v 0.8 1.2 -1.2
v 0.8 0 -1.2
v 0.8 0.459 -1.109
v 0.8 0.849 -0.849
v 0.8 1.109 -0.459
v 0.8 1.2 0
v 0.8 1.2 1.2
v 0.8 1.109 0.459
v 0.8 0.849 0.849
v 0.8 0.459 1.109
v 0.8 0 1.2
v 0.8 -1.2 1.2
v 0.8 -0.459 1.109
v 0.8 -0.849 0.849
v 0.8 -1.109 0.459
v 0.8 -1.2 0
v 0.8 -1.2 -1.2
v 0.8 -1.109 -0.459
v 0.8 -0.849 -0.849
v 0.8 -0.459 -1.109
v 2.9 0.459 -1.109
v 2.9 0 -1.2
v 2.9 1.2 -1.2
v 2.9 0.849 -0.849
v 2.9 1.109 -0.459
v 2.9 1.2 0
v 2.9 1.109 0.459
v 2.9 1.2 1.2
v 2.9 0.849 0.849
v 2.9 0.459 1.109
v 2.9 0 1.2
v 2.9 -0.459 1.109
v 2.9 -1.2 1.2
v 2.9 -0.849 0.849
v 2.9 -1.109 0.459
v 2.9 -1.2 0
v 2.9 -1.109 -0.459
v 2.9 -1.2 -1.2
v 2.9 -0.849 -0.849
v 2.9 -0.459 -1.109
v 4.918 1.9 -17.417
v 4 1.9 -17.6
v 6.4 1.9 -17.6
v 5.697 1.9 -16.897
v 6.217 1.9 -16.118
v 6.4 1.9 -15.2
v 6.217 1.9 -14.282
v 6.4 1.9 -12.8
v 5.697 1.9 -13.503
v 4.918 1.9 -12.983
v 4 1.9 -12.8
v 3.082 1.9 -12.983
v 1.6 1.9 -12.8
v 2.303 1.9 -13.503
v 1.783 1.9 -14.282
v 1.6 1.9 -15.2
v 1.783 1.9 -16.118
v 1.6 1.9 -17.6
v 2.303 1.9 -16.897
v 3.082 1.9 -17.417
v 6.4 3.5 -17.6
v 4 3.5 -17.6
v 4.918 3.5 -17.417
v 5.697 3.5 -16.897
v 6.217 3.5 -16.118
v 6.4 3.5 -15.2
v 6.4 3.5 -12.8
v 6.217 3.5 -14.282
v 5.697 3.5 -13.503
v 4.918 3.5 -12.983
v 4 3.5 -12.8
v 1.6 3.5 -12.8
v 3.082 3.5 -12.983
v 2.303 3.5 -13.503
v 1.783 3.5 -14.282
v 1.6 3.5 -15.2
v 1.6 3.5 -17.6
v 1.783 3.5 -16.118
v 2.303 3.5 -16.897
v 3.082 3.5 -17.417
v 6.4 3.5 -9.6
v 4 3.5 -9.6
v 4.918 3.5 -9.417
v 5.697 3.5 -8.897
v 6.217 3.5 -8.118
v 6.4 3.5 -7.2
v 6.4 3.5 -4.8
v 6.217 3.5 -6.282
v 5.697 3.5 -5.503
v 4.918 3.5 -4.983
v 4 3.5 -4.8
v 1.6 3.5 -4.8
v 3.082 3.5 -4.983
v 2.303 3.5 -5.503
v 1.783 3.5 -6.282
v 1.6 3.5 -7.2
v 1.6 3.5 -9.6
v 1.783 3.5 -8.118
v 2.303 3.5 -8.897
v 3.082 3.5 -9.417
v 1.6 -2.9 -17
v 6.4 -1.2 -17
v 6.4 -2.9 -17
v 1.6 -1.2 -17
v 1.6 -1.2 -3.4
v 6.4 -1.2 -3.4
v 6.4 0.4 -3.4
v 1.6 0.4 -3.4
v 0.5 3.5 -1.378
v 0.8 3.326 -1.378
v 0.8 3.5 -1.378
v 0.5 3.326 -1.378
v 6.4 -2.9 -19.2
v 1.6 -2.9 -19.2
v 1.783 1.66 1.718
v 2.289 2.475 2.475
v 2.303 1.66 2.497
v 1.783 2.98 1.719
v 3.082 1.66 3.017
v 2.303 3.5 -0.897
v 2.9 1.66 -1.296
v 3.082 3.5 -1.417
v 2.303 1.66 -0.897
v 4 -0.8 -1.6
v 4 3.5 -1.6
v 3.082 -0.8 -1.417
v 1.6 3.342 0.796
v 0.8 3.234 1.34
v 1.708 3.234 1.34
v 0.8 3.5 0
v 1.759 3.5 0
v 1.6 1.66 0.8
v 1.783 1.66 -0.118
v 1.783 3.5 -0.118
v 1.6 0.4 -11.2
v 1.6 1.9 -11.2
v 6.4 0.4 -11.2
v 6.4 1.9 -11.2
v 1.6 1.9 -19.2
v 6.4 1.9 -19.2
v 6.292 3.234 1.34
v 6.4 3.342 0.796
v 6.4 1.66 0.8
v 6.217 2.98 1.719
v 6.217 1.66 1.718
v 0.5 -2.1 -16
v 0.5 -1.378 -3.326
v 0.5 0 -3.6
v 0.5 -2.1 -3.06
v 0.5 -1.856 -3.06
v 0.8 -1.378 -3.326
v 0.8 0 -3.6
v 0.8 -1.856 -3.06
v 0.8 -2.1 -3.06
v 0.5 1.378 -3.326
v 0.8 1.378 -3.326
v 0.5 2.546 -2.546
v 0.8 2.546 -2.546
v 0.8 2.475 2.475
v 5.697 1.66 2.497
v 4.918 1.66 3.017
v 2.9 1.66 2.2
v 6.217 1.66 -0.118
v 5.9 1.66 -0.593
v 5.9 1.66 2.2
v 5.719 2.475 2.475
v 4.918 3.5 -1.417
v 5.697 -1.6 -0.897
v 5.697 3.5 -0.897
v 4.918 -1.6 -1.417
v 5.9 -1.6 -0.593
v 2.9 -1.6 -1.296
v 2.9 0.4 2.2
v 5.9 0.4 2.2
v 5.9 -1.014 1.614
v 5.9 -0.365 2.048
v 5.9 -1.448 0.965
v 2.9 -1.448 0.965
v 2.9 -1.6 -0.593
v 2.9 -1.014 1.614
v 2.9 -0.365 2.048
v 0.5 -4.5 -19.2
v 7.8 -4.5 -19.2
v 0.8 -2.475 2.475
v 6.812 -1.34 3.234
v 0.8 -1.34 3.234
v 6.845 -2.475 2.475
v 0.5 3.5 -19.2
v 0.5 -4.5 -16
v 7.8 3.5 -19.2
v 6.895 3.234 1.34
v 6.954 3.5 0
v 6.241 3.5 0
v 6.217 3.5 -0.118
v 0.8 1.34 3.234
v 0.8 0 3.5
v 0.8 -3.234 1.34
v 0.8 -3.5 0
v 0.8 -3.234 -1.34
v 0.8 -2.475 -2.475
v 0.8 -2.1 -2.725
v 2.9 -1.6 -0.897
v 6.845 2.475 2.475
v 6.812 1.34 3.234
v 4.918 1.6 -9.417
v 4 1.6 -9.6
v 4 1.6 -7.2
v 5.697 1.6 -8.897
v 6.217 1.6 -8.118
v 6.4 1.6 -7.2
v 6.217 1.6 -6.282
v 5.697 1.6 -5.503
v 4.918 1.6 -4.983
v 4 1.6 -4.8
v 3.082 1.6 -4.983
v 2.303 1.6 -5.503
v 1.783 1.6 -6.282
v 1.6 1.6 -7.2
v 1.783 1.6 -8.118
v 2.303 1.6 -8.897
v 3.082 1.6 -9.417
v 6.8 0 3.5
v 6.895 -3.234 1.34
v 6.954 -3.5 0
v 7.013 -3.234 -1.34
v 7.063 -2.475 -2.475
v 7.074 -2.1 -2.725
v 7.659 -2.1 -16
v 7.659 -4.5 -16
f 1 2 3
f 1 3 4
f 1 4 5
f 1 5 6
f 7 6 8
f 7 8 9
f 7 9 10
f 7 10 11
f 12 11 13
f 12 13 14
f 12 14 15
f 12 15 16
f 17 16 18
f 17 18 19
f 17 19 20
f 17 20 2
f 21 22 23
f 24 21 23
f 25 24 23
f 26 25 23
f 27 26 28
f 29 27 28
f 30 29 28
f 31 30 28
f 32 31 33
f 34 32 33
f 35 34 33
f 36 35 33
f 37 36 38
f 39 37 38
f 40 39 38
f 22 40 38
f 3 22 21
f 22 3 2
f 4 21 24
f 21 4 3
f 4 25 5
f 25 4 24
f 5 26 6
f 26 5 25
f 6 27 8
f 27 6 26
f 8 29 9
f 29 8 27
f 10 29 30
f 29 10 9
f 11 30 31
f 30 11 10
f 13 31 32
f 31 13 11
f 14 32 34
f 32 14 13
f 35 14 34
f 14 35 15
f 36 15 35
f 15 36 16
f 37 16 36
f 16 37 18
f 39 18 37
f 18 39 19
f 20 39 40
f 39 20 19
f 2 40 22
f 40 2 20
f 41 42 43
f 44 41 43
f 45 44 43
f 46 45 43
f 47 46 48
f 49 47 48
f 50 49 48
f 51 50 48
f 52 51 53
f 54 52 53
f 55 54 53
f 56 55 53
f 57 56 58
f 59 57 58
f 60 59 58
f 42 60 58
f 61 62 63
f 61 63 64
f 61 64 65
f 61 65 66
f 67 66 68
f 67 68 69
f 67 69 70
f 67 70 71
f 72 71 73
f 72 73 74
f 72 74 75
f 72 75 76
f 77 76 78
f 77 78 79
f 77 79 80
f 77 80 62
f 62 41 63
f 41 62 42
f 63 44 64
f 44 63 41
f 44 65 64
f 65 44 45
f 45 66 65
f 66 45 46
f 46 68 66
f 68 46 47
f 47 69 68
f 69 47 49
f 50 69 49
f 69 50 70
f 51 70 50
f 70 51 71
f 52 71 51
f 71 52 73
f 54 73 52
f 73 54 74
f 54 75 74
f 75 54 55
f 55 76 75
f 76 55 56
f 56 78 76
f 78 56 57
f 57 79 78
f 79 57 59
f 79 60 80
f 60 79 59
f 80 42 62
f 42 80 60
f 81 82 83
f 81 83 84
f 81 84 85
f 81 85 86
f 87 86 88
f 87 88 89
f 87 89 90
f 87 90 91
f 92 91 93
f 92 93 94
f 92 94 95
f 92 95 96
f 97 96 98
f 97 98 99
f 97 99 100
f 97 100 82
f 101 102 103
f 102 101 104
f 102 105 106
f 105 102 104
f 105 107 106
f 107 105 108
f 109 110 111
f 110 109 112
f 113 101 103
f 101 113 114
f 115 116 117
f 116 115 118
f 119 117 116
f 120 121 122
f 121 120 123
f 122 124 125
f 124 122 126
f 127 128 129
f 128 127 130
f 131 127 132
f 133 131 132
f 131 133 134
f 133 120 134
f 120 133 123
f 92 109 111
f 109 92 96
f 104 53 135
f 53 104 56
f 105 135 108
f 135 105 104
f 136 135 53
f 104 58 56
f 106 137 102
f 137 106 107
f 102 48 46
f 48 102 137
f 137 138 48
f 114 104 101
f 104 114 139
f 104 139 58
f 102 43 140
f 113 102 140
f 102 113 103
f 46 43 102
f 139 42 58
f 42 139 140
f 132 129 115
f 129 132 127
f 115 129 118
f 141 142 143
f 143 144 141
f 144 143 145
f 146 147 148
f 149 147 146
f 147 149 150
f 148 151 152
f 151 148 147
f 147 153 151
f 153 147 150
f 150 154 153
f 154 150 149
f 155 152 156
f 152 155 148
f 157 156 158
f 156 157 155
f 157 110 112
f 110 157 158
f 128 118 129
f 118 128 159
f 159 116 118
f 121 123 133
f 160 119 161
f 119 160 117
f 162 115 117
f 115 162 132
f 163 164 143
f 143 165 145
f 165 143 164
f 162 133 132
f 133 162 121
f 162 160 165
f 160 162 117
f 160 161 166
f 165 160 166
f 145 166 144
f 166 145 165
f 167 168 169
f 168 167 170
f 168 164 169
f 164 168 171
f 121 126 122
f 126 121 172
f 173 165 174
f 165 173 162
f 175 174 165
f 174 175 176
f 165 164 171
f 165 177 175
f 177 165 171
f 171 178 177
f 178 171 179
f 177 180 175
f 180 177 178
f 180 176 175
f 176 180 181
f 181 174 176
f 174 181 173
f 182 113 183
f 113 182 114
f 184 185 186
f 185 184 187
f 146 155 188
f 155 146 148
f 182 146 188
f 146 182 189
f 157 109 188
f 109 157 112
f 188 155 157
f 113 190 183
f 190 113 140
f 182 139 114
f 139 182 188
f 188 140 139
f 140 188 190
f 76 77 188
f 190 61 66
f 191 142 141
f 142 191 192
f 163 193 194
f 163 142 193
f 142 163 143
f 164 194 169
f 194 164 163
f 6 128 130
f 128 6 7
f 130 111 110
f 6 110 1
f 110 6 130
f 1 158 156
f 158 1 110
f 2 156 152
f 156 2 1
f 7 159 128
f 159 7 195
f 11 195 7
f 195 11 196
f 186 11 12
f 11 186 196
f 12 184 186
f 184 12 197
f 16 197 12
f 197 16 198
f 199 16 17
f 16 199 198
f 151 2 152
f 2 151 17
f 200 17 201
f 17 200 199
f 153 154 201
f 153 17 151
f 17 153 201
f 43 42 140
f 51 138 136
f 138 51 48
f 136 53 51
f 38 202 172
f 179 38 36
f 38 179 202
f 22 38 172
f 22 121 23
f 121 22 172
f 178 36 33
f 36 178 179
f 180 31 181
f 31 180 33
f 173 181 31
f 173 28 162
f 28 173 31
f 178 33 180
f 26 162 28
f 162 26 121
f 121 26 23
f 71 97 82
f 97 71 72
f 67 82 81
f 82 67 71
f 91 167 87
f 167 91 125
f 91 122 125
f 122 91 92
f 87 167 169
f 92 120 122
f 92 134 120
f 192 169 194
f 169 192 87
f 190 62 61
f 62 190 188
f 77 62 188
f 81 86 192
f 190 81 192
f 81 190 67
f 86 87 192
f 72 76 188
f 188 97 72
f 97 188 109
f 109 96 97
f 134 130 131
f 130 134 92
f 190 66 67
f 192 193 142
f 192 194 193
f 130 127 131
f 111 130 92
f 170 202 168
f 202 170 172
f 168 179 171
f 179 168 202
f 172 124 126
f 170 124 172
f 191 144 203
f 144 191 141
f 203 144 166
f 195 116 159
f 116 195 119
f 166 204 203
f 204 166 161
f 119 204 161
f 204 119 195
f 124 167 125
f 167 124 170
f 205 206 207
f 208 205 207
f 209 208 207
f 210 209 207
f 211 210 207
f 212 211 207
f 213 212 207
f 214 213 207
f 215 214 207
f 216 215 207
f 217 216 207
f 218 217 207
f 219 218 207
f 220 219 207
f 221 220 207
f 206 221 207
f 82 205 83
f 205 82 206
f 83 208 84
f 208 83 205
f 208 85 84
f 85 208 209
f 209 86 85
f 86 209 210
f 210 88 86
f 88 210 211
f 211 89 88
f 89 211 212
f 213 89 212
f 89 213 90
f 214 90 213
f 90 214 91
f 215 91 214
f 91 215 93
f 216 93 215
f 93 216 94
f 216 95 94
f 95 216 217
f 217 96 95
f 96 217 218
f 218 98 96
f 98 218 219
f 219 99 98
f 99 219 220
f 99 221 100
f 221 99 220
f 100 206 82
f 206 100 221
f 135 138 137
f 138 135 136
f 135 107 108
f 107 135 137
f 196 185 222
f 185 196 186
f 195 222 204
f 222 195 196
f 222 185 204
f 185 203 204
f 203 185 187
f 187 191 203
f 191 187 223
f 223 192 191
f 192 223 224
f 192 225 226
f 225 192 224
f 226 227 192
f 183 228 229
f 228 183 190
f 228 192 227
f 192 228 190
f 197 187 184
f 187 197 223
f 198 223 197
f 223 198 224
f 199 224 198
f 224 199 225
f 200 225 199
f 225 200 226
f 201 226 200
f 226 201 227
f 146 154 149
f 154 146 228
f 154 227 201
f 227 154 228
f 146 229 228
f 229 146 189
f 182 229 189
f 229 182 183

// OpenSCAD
use <../lib.scad>
use <s/87775s01.scad>
use <s/87775s03.scad>
function ldraw_lib__87775() = [
// 0 Minifig Leg Left Long with Closed Hole
// 0 Name: 87775.dat
// 0 Author: Magnus Forsberg [MagFors]
// 0 !LDRAW_ORG Part UPDATE 2023-03
// 0 !LICENSE Licensed under CC BY 4.0 : see CAreadme.txt
// 
// 0 !HELP Move down 12 units to align with hips
// 0 !HELP Move at z=1.25 relative to stud grid
// 
// 0 BFC CERTIFY CCW
  [0,"BFC","CERTIFY"],
  [0,"BFC","CCW"],
// 
// 0 !KEYWORDS Jessie, Toy Story, Woody
// 
// 0 !HISTORY 2019-06-07 [MagFors] Reworked with 3817b as reference
// 0 !HISTORY 2023-02-11 [MagFors] Reworked with 3817c as reference
// 0 !HISTORY 2023-06-24 [OrionP] Official Update 2023-03
// 
// 
// 1 16 0 0 0 1 0 0 0 1 0 0 0 1 s\87775s01.dat
  [1,16,0,0,0,1,0,0,0,1,0,0,0,1, ldraw_lib__s__87775s01()],
// 0 // Rounded Front
// 1 16 0 0 0 1 0 0 0 1 0 0 0 1 s\87775s03.dat
  [1,16,0,0,0,1,0,0,0,1,0,0,0,1, ldraw_lib__s__87775s03()],
// 0 // Flat Front
// 4 16 1.25 7.65 -5.25 1.25001 40 -5.25 19.1476 40 -5.25 2 7.65 -5.25
  [4,16,1.25,7.65,-5.25,1.25001,40,-5.25,19.1476,40,-5.25,2,7.65,-5.25],
// 4 16 19.1476 40 -5.25 17.6856 6.8134 -5.25 2 6.8134 -5.25 2 7.65 -5.25
  [4,16,19.1476,40,-5.25,17.6856,6.8134,-5.25,2,6.8134,-5.25,2,7.65,-5.25],
// 0 // Foot Top
// 4 16 1.25001 40 -5.25 1.25001 40 -11.25 19.1476 40 -11.25 19.1476 40 -5.25
  [4,16,1.25001,40,-5.25,1.25001,40,-11.25,19.1476,40,-11.25,19.1476,40,-5.25],
// 0 // Foot Front
// 4 16 19.5 48 -11.25 19.1476 40 -11.25 1.25001 40 -11.25 1.25 48 -11.25
  [4,16,19.5,48,-11.25,19.1476,40,-11.25,1.25001,40,-11.25,1.25,48,-11.25],
];
module ldraw_lib__87775(step=0, col=false, unit=2/5, alt=false, line=0.2, solid=!$preview)
    makepoly(ldraw_lib__87775(), step=step, col=col, unit=unit, alt=alt, line=line, solid=solid);
ldraw_lib__87775(line=0.2);
